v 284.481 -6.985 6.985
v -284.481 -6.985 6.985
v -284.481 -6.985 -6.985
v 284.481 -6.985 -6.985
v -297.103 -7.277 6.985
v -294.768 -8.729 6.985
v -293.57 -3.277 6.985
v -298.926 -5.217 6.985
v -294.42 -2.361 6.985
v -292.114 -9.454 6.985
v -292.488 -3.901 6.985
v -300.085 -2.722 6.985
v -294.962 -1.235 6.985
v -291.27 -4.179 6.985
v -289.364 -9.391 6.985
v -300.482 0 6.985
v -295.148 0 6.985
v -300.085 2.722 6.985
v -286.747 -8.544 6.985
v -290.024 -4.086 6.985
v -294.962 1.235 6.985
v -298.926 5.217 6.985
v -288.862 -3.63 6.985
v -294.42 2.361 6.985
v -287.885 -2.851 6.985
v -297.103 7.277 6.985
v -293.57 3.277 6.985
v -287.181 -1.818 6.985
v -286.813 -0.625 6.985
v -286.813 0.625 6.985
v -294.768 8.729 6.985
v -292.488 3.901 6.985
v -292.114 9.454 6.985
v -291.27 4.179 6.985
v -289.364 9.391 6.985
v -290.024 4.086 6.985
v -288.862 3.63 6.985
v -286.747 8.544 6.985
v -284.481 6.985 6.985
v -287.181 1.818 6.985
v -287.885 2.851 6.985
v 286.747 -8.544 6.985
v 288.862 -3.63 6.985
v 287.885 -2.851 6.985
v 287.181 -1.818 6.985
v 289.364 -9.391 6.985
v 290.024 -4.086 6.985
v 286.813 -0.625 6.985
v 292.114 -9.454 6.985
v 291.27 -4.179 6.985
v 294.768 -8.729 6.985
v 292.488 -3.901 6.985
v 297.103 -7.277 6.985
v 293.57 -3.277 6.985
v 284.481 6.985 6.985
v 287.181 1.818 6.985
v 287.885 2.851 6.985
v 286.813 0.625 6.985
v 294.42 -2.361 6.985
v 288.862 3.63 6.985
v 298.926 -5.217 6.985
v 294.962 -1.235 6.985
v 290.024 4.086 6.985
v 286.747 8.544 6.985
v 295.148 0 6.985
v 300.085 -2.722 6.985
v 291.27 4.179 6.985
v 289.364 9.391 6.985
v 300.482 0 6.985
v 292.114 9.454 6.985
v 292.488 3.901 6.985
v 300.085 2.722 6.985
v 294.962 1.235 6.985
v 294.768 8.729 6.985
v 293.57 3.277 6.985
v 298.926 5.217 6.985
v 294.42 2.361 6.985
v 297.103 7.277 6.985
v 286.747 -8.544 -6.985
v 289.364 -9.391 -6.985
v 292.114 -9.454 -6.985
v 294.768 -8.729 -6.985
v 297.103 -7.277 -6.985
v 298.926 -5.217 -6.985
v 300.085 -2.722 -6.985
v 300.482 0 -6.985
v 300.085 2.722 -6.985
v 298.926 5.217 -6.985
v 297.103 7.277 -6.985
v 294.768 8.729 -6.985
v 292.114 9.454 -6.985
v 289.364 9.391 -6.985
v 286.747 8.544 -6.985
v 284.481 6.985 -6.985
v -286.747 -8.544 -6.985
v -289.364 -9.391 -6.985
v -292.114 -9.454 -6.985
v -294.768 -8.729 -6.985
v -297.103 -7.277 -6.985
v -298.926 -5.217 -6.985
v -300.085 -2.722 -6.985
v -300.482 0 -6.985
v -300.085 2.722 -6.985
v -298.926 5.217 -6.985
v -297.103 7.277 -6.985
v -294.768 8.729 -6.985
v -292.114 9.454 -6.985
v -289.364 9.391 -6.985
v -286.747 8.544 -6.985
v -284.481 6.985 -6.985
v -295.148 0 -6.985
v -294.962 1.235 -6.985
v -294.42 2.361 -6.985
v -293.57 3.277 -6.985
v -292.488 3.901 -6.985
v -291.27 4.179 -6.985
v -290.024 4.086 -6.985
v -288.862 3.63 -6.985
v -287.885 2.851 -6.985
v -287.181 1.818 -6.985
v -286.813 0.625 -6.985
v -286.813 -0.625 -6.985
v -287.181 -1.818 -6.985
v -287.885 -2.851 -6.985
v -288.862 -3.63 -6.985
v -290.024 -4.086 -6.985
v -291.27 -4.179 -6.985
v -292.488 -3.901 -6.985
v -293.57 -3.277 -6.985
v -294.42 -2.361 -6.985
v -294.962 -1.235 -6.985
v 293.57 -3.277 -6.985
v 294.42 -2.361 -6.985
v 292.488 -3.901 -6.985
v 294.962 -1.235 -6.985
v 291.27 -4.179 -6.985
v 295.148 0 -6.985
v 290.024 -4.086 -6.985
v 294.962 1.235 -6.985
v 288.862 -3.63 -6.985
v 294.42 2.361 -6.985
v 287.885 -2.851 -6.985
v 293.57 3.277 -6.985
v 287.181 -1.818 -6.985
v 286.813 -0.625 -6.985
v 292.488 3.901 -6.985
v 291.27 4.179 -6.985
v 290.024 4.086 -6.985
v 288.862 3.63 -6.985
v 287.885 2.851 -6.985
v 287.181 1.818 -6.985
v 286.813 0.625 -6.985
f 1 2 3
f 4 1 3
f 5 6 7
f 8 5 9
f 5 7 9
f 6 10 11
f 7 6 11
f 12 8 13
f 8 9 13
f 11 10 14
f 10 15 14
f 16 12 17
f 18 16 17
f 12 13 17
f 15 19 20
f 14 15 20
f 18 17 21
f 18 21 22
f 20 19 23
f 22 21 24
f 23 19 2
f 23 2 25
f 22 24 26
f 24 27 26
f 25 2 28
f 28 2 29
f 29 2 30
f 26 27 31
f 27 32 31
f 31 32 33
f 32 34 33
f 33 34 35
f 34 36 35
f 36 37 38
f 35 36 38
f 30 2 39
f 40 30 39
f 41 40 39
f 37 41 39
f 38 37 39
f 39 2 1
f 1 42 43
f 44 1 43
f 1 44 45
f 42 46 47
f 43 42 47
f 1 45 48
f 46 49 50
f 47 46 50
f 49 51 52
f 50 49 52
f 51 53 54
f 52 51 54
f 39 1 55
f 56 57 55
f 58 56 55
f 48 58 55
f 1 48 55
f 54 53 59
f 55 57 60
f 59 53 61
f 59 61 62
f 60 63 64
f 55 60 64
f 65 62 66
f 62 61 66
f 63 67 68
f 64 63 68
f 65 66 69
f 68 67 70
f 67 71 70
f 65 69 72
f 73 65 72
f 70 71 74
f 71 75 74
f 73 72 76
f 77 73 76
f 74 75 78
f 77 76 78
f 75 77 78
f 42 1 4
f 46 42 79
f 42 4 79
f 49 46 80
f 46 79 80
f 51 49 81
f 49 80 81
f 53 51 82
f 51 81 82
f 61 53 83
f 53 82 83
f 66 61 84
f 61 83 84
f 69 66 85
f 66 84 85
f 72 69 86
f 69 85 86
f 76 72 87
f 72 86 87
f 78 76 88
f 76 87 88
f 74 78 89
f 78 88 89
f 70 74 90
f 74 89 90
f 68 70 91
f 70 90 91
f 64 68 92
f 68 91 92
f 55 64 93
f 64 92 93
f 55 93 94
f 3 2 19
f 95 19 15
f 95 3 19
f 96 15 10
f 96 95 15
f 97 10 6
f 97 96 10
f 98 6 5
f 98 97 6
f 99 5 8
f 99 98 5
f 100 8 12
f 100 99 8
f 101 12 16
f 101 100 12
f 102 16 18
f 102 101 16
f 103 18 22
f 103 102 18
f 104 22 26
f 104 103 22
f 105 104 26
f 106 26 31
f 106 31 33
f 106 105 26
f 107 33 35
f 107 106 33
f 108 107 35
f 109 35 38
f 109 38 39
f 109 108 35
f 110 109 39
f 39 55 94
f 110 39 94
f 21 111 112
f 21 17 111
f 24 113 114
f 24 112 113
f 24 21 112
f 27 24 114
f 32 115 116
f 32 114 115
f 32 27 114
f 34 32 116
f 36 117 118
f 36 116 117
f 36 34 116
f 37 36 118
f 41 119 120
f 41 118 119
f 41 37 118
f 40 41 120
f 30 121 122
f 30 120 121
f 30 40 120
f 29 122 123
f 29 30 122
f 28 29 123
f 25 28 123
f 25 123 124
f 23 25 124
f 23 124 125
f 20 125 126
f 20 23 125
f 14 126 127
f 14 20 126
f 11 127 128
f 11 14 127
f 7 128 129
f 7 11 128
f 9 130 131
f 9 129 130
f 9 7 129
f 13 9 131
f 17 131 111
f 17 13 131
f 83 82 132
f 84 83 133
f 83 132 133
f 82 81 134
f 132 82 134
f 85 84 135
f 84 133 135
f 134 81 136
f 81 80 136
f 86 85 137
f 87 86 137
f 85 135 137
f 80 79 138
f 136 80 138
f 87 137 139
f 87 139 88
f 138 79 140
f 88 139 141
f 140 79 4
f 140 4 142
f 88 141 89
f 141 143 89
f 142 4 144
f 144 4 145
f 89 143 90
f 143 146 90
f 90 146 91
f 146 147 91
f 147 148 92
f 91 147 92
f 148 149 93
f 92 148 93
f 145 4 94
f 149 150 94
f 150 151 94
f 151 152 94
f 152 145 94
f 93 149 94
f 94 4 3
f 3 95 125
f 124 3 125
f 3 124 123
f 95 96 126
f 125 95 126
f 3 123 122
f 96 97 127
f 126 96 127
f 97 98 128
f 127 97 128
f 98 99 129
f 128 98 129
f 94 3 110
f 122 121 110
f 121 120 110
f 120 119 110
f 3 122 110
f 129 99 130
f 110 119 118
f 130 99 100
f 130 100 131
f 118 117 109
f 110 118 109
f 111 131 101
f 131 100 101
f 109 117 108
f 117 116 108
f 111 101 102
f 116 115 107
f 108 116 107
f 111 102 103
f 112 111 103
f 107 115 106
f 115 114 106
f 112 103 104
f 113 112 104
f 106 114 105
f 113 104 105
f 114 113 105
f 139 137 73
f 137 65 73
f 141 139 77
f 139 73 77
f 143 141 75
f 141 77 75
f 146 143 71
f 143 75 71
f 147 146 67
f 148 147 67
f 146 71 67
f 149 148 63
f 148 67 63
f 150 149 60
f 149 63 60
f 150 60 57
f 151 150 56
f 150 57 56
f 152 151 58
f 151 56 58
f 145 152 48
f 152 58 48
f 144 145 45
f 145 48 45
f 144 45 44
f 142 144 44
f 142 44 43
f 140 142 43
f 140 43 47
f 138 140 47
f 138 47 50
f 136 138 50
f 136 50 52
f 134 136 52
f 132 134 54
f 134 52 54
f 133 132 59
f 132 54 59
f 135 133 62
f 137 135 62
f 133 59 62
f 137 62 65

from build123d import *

# Parameters (mm, degrees)
BOSS_EXTRUDE1_DEPTH             = 290.957
BOSS_EXTRUDE1_DEPTH_BACK        = 290.957
SKETCH3_W                       = 13.97
SKETCH3_H                       = 13.97
BOSS_EXTRUDE4_REACH             = 293.125
SKETCH6_R                       = 9.525
BOSS_EXTRUDE4_DIRECTION_2_REACH = 293.125
SKETCH7_R                       = 4.191
CUT_EXTRUDE2_DEPTH              = 301.714063811


with BuildPart() as part:
    # Sketch3 → Boss-Extrude1 (new, two sides: drawn at the far end of the back side and taken through both)
    with BuildSketch(Plane(origin=(0, 0, 0), x_dir=(0, 0, -1), z_dir=(1, 0, 0)).offset(-BOSS_EXTRUDE1_DEPTH_BACK)):
        Rectangle(SKETCH3_W, SKETCH3_H)
    extrude(amount=BOSS_EXTRUDE1_DEPTH + BOSS_EXTRUDE1_DEPTH_BACK)

    # Boss-Extrude4: up to this face of the body (flat: up to its plane)
    boss_extrude4_end = Plane(part.part.faces().sort_by_distance((0, 0, -6.985))[0])
    # Sketch6 → Boss-Extrude4 (add, up to the picked face)
    with BuildSketch(Plane.XY, mode=Mode.PRIVATE) as boss_extrude4_sk1:
        with Locations((290.957, 0)):
            Circle(SKETCH6_R)
    boss_extrude4_tool1 = split(extrude(boss_extrude4_sk1.sketch, amount=-BOSS_EXTRUDE4_REACH, mode=Mode.PRIVATE), bisect_by=boss_extrude4_end, keep=Keep.BOTH, mode=Mode.PRIVATE)
    boss_extrude4 = boss_extrude4_tool1.solids().sort_by(Axis((290.957, 0, 0), (0, 0, -1)))[0]
    add(boss_extrude4)

    # Boss-Extrude4 direction 2: up to this face of the body (flat: up to its plane)
    boss_extrude4_direction_2_end = Plane(part.part.faces().sort_by_distance((0, 0, 6.985))[0])
    # Sketch6 → Boss-Extrude4 direction 2 (add, up to the picked face)
    with BuildSketch(Plane.XY, mode=Mode.PRIVATE) as boss_extrude4_direction_2_sk1:
        with Locations((290.957, 0)):
            Circle(SKETCH6_R)
    boss_extrude4_direction_2_tool1 = split(extrude(boss_extrude4_direction_2_sk1.sketch, amount=BOSS_EXTRUDE4_DIRECTION_2_REACH, mode=Mode.PRIVATE), bisect_by=boss_extrude4_direction_2_end, keep=Keep.BOTH, mode=Mode.PRIVATE)
    boss_extrude4_direction_2 = boss_extrude4_direction_2_tool1.solids().sort_by(Axis((290.957, 0, 0), (0, 0, 1)))[0]
    add(boss_extrude4_direction_2)

    # Sketch7 → Cut-Extrude2 (cut, symmetric)
    with BuildSketch(Plane.XY):
        with Locations((290.957, 0)):
            Circle(SKETCH7_R)
    cut_extrude2 = extrude(amount=CUT_EXTRUDE2_DEPTH, both=True, mode=Mode.SUBTRACT)

    # Mirror3: Boss-Extrude4, Boss-Extrude4 direction 2, Cut-Extrude2 across plane
    add(boss_extrude4.mirror(Plane(origin=(0, 0, 0), x_dir=(0, 0, 1), z_dir=(1, 0, 0))))
    add(boss_extrude4_direction_2.mirror(Plane(origin=(0, 0, 0), x_dir=(0, 0, 1), z_dir=(1, 0, 0))))
    add(cut_extrude2.mirror(Plane(origin=(0, 0, 0), x_dir=(0, 0, 1), z_dir=(1, 0, 0))), mode=Mode.SUBTRACT)


solid = part.part
